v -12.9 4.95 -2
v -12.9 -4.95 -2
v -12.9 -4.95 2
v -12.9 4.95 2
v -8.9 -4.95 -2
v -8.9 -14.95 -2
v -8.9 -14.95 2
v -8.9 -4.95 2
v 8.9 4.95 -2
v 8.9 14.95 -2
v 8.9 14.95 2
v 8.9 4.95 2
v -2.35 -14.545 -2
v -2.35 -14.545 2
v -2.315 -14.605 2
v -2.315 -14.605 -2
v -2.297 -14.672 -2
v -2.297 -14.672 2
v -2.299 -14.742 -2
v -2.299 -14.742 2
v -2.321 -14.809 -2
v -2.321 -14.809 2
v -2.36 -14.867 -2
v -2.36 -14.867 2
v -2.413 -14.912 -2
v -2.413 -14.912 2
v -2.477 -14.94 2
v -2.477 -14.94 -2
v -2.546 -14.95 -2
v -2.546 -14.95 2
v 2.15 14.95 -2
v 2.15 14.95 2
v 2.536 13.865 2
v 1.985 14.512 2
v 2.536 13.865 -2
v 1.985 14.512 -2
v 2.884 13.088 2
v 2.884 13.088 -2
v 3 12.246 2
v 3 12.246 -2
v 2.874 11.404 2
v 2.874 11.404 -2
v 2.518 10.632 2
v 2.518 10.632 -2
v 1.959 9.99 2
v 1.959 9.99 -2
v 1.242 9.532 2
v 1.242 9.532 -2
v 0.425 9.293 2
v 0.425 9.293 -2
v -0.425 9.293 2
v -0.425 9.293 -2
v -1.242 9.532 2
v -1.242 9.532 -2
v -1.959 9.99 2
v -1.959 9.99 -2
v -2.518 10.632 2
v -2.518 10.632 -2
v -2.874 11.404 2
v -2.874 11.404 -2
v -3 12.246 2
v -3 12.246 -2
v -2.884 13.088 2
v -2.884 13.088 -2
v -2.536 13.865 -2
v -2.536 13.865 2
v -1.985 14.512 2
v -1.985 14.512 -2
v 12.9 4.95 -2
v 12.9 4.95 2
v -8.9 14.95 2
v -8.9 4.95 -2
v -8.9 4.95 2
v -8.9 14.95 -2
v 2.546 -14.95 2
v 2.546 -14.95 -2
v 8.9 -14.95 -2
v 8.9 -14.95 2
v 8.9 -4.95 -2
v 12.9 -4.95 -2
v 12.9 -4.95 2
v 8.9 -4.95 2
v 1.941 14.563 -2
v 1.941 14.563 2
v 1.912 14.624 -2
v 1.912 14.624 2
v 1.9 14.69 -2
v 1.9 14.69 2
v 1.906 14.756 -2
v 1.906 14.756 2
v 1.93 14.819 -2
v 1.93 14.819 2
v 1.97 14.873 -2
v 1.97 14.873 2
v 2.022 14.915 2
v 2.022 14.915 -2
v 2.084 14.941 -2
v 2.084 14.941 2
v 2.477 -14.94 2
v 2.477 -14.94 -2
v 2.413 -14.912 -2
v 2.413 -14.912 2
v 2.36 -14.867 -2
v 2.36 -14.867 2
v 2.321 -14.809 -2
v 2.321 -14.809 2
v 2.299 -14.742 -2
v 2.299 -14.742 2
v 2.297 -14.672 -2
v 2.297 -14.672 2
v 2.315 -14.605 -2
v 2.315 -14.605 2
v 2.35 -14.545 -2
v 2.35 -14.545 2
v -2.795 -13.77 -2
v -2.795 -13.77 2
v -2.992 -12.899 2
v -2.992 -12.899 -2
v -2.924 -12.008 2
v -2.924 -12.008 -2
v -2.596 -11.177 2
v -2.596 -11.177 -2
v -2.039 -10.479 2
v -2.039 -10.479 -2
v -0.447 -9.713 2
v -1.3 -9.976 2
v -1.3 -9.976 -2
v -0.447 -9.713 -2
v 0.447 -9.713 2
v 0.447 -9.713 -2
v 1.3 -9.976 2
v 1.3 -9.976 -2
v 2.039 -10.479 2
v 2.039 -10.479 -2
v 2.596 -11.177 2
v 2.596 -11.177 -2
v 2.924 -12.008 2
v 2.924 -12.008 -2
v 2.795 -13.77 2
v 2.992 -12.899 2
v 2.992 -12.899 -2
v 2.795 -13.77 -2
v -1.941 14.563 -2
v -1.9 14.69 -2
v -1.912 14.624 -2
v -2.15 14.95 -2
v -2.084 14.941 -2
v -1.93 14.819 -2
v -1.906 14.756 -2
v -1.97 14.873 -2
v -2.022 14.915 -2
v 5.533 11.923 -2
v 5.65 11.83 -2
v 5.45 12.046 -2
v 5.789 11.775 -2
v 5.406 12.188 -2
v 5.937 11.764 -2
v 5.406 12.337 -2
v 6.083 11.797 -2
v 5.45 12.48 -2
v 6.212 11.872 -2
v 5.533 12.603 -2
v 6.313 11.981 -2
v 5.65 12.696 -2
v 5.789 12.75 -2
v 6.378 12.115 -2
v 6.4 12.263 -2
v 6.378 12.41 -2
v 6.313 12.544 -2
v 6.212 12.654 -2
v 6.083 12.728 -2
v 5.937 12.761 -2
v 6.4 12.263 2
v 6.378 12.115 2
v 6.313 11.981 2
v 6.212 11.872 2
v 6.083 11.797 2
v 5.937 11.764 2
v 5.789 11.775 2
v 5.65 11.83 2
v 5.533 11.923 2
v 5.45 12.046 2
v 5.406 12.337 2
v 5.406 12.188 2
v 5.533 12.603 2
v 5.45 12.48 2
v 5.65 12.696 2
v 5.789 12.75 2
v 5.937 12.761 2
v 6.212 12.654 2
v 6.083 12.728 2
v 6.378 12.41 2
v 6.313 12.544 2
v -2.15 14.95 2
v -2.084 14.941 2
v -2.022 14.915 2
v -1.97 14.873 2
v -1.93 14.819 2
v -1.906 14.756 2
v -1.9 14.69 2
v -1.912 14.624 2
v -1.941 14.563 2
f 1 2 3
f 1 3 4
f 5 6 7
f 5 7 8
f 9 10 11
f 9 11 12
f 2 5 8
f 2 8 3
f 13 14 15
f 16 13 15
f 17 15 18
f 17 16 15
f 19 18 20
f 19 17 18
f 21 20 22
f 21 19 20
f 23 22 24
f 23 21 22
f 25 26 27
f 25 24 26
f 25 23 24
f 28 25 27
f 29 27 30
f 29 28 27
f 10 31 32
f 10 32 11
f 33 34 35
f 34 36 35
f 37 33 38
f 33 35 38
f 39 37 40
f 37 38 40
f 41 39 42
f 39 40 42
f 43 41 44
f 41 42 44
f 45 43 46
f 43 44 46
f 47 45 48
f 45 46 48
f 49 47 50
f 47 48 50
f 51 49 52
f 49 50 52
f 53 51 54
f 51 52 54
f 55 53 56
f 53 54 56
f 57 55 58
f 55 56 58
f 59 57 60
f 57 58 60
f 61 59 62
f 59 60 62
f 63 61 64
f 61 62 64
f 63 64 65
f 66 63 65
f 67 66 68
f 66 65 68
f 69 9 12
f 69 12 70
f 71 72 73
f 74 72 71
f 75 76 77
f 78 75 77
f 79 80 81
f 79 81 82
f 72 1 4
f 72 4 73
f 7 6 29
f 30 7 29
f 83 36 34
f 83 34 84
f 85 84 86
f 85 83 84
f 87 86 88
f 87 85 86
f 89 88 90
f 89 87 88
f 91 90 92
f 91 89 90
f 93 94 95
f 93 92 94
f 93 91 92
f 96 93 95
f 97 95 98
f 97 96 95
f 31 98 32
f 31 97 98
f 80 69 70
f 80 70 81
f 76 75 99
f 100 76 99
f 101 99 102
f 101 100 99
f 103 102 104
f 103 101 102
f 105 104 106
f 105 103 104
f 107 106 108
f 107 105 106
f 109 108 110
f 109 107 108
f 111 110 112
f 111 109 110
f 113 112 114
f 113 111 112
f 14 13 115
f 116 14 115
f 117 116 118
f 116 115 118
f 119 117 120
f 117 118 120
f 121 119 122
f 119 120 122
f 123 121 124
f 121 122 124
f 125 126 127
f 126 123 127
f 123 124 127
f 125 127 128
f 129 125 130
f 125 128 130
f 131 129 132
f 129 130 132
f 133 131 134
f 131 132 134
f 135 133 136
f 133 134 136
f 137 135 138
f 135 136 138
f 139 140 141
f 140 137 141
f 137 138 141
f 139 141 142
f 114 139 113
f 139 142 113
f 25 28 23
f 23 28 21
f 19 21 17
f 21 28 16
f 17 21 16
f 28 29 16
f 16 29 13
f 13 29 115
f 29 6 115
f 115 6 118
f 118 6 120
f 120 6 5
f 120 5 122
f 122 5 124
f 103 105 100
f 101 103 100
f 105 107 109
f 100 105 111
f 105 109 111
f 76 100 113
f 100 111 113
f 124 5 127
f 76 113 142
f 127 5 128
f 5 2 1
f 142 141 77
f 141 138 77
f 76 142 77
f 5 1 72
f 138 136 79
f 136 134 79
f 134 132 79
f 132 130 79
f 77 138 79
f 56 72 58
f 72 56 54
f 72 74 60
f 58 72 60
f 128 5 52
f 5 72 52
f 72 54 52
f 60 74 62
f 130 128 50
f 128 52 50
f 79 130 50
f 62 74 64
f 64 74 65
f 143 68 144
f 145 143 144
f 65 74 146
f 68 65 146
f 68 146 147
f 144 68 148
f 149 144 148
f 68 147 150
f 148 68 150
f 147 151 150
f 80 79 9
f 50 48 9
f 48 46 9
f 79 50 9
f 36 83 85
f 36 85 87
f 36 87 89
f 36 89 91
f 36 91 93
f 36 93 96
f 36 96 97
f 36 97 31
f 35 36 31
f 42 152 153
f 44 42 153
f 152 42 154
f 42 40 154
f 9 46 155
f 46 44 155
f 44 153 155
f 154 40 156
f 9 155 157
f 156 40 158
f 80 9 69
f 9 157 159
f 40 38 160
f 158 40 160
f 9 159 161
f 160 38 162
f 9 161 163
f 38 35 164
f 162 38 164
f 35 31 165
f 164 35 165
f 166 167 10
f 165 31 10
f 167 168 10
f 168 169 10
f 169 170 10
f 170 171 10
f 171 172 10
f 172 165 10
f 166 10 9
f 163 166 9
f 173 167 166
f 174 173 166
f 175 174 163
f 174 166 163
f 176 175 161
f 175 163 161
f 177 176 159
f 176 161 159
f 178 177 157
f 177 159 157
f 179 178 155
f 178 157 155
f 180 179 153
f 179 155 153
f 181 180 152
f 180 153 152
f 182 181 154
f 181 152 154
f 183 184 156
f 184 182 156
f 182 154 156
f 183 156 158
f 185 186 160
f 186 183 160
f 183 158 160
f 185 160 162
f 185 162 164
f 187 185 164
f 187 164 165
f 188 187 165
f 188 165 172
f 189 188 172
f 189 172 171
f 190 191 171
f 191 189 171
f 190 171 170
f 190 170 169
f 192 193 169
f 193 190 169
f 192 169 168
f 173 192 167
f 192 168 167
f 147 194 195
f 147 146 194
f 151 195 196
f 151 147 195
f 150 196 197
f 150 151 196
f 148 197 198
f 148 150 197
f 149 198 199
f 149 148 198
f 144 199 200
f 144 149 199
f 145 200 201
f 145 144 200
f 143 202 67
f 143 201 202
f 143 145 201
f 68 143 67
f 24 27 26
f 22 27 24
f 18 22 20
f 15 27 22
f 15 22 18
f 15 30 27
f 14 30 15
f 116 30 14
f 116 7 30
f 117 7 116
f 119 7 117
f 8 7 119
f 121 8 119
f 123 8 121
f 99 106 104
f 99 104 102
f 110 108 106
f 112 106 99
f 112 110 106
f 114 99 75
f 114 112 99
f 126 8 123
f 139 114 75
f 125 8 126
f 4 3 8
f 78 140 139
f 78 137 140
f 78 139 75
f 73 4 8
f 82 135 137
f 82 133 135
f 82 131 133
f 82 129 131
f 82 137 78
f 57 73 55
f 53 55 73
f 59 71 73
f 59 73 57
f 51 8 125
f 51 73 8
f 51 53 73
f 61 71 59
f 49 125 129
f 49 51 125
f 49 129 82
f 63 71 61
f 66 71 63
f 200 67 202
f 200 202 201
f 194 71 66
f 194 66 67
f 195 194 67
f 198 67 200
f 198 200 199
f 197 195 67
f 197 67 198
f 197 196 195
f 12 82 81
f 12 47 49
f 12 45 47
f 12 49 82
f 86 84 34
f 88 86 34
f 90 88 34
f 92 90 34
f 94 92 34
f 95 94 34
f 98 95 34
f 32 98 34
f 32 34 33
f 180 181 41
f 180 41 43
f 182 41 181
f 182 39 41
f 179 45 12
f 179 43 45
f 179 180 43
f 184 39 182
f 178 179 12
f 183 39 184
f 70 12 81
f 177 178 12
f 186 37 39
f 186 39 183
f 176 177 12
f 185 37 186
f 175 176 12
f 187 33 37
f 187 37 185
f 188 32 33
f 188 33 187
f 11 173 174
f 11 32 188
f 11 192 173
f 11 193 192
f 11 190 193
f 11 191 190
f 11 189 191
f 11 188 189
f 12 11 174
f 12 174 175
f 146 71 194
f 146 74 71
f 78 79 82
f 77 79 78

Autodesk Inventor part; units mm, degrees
ref_plane "YZ Plane" through (0, 0, 0) normal (1, 0, 0) x (0, 1, 0)
ref_plane "XZ Plane" through (0, 0, 0) normal (0, 1, 0) x (-1, 0, 0)
ref_plane "XY Plane" through (0, 0, 0) normal (0, 0, 1) x (1, 0, 0)
sketch "Náčrt1" plane through (0, 0, 0) normal (0, 0, 1) x (1, 0, 0)
  line L0 (-8.9, 4.95) -> (-8.9, 14.95)
  line L1 (-8.9, 14.95) -> (-2.15, 14.95)
  line L2 (2.15, 14.95) -> (8.9, 14.95)
  line L3 (8.9, 14.95) -> (8.9, 4.95)
  line L4 (8.9, 4.95) -> (12.9, 4.95)
  line L5 (12.9, 4.95) -> (12.9, -4.95)
  line L6 (12.9, -4.95) -> (8.9, -4.95)
  line L7 (8.9, -4.95) -> (8.9, -14.95)
  line L8 (-8.9, -14.95) -> (-8.9, -4.95)
  line L9 (-12.9, -4.95) -> (-12.9, 4.95)
  line L10 (-12.9, 4.95) -> (-8.9, 4.95)
  line L11 (-8.9, -4.95) -> (-12.9, -4.95)
  arc A0 (-1.9846, 14.5125) -> (1.9846, 14.5125) centre (0, 12.2628) ccw
  arc A1 (-1.9846, 14.5125) -> (-2.15, 14.95) centre (-2.15, 14.7) ccw
  arc A2 (2.15, 14.95) -> (1.9846, 14.5125) centre (2.15, 14.7) ccw
  line L12 (-8.9, -14.95) -> (-2.5458, -14.95)
  arc A3 (2.35, -14.5446) -> (-2.35, -14.5446) centre (0, -12.6798) ccw
  line L13 (2.5458, -14.95) -> (8.9, -14.95)
  arc A4 (-2.5458, -14.95) -> (-2.35, -14.5446) centre (-2.5458, -14.7) ccw
  arc A5 (2.35, -14.5446) -> (2.5458, -14.95) centre (2.5458, -14.7) ccw
  circle A6 centre (5.9, 12.2628) radius 0.5
  point P0 (0, 0)
  point P1 (-1.3338, 14.95)
  point P2 (1.3338, 14.95)
  point P3 (12.9, 0)
  point P4 (-1.9612, -14.95)
  point P5 (1.9612, -14.95)
  dimension "d0" = 9.9
  dimension "d1" = 17.8
  dimension "d2" = 4
  dimension "d4" = 3
  dimension "d5" = 0.25
  dimension "d6" = 3.8
  dimension "d7" = 0.25
  dimension "d8" = 4.7
  dimension "d18" = 1
  dimension "d19" = 3
  dimension "d20" = 10
extrude "Vysunutí1" add sketch "Náčrt1" along normal mid plane 4
properties part number "Spacer"
